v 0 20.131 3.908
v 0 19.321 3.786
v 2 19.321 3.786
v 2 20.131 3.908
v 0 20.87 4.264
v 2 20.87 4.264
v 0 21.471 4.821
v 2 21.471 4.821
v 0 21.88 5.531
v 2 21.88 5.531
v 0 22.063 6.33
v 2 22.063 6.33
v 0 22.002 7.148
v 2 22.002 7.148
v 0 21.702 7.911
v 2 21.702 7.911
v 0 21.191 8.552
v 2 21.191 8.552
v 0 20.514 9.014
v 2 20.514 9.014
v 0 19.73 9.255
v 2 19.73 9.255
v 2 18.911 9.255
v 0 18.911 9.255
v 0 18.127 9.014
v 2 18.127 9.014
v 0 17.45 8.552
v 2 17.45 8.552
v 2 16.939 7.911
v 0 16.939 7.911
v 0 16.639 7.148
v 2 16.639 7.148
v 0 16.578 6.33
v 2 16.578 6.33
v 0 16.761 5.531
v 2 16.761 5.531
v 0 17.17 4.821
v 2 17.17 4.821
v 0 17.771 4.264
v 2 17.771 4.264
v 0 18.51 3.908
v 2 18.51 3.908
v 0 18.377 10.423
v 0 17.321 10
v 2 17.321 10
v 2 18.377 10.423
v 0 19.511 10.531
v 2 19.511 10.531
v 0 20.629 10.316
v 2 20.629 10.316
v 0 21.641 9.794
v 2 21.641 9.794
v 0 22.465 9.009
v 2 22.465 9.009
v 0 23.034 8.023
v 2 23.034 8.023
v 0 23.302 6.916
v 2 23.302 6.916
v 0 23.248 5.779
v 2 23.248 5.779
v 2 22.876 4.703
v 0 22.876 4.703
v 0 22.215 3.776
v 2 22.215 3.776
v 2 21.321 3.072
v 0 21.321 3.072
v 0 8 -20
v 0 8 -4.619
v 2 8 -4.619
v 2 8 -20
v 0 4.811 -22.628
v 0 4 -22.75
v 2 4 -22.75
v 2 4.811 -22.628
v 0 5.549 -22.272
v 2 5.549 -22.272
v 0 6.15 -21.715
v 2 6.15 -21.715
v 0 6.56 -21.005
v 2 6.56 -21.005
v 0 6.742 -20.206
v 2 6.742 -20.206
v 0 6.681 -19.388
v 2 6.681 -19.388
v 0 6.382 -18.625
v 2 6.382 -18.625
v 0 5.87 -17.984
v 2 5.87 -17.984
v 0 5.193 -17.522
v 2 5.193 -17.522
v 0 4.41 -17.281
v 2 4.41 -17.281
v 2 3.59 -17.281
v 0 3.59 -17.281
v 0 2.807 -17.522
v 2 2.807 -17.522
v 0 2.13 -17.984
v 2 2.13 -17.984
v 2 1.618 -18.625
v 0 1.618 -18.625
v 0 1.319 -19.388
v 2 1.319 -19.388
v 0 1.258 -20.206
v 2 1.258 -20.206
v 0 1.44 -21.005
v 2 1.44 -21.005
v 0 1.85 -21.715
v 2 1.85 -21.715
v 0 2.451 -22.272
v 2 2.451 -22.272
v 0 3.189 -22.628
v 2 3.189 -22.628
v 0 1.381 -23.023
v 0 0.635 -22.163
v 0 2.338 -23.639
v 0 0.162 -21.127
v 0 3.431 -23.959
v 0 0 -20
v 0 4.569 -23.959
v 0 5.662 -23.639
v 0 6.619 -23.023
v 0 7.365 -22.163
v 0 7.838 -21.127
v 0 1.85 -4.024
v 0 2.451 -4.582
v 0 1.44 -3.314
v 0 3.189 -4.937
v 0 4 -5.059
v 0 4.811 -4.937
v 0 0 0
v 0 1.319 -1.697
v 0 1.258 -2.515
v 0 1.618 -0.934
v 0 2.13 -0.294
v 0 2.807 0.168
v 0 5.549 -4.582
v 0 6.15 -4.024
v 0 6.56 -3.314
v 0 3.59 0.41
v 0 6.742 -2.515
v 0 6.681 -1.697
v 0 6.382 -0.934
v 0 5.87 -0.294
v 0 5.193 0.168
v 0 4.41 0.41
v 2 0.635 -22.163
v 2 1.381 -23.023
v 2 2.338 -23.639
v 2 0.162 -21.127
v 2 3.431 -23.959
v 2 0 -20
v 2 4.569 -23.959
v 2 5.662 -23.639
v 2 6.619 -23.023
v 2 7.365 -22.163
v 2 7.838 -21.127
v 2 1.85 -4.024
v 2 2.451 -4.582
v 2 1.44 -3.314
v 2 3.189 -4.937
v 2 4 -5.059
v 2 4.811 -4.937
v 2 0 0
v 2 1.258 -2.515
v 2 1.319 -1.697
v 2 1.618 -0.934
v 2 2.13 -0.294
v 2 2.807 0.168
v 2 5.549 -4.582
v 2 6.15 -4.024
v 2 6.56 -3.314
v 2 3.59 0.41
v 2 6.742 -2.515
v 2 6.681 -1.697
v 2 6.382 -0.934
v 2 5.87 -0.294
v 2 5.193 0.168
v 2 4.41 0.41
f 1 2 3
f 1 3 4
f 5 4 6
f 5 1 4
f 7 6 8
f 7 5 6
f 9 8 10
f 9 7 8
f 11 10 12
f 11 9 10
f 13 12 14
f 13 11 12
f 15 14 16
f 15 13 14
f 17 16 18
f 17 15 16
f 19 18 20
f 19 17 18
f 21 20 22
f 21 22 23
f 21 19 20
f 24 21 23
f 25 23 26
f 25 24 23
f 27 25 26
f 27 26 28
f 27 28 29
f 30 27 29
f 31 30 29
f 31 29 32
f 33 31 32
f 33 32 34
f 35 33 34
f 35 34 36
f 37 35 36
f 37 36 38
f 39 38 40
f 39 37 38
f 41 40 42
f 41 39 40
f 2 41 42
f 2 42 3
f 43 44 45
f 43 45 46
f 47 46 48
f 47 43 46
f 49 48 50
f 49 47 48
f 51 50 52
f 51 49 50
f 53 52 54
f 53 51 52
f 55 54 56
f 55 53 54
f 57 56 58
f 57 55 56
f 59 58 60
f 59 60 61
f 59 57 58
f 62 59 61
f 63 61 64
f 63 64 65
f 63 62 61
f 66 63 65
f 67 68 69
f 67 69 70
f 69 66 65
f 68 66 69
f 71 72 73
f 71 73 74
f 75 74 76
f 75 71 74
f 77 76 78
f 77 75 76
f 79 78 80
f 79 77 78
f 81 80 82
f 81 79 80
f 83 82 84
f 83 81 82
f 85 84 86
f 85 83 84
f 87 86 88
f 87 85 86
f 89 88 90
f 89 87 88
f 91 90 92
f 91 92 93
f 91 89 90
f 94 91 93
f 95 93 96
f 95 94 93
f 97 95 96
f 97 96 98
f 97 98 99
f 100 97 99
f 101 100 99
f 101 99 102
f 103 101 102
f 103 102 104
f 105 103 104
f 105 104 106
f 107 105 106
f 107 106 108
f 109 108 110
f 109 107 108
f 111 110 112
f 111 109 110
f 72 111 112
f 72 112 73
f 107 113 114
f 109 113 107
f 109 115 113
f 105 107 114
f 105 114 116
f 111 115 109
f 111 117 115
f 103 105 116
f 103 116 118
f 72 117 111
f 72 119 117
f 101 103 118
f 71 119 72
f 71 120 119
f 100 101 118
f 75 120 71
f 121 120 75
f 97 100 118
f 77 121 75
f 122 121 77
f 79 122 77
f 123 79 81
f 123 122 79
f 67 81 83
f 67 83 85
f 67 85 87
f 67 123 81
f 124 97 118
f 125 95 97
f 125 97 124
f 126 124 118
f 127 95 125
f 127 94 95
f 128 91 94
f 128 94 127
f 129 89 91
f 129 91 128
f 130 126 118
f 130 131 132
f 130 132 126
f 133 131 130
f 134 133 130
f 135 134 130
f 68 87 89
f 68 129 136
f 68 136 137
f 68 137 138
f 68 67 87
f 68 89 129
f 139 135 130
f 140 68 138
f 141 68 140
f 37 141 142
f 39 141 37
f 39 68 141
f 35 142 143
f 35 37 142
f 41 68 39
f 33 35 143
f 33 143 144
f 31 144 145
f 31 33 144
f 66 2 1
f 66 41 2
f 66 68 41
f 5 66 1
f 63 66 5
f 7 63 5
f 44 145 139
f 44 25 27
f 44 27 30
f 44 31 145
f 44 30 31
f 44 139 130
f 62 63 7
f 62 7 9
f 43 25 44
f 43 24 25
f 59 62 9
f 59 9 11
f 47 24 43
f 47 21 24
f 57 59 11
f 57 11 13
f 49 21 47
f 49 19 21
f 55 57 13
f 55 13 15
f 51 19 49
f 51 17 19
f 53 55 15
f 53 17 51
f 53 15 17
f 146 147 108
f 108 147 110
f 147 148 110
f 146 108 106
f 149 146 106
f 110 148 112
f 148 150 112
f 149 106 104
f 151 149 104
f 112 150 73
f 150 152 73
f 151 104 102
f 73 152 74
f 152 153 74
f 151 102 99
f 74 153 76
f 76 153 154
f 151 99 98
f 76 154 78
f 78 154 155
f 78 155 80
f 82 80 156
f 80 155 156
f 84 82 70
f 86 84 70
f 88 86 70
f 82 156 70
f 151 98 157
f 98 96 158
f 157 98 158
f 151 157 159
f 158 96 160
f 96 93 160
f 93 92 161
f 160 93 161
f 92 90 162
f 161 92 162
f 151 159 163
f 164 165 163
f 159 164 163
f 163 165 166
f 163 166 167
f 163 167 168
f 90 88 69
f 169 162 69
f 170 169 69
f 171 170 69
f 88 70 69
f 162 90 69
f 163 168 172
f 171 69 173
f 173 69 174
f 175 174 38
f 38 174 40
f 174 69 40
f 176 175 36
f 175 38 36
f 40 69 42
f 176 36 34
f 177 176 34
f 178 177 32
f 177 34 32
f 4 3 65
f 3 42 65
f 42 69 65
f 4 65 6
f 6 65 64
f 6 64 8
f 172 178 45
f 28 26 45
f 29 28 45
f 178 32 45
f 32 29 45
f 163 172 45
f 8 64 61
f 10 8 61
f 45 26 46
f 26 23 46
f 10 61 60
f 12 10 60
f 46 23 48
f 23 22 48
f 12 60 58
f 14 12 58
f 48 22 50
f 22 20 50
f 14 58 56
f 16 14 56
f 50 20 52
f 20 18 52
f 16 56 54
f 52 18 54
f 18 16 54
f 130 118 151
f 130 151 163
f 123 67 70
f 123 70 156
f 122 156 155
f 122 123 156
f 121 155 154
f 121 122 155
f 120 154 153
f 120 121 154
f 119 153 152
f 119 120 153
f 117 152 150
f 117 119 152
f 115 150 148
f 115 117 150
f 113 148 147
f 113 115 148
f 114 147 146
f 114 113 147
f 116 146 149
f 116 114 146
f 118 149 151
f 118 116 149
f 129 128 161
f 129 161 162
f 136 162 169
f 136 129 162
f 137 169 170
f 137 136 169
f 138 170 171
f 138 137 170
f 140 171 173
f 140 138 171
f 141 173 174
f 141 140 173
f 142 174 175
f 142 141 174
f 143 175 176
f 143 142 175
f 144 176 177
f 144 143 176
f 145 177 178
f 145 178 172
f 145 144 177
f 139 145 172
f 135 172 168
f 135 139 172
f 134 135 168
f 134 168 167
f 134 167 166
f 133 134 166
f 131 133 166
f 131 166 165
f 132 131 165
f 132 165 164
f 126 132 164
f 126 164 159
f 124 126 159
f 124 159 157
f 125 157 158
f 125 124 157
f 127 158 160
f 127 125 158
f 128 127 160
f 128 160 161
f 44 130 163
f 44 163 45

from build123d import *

# Parameters (mm, degrees)
SKETCH1_R           = 2.75
BOSS_EXTRUDE1_DEPTH = 2


with BuildPart() as part:
    # Sketch1 → Boss-Extrude1 (new body)
    with BuildSketch(Plane(origin=(0, 0, 0), x_dir=(0, 0, -1), z_dir=(1, 0, 0))):
        with BuildLine():
            Line((0, 0), (-10, 17.320508076))
            ThreePointArc((-10, 17.320508076), (-8.535898385, 22.784609691), (-3.07179677, 21.320508076))
            Line((-3.07179677, 21.320508076), (4.618802154, 8))
            Line((4.618802154, 8), (20, 8))
            ThreePointArc((20, 8), (24, 4), (20, 0))
            Line((20, 0), (0, 0))
        make_face()
        with Locations((-6.535898385, 19.320508076)):
            Circle(SKETCH1_R, mode=Mode.SUBTRACT)
        with Locations((20, 4)):
            Circle(SKETCH1_R, mode=Mode.SUBTRACT)
        with Locations((2.309401077, 4)):
            Circle(SKETCH1_R, mode=Mode.SUBTRACT)
    extrude(amount=BOSS_EXTRUDE1_DEPTH)


solid = part.part
